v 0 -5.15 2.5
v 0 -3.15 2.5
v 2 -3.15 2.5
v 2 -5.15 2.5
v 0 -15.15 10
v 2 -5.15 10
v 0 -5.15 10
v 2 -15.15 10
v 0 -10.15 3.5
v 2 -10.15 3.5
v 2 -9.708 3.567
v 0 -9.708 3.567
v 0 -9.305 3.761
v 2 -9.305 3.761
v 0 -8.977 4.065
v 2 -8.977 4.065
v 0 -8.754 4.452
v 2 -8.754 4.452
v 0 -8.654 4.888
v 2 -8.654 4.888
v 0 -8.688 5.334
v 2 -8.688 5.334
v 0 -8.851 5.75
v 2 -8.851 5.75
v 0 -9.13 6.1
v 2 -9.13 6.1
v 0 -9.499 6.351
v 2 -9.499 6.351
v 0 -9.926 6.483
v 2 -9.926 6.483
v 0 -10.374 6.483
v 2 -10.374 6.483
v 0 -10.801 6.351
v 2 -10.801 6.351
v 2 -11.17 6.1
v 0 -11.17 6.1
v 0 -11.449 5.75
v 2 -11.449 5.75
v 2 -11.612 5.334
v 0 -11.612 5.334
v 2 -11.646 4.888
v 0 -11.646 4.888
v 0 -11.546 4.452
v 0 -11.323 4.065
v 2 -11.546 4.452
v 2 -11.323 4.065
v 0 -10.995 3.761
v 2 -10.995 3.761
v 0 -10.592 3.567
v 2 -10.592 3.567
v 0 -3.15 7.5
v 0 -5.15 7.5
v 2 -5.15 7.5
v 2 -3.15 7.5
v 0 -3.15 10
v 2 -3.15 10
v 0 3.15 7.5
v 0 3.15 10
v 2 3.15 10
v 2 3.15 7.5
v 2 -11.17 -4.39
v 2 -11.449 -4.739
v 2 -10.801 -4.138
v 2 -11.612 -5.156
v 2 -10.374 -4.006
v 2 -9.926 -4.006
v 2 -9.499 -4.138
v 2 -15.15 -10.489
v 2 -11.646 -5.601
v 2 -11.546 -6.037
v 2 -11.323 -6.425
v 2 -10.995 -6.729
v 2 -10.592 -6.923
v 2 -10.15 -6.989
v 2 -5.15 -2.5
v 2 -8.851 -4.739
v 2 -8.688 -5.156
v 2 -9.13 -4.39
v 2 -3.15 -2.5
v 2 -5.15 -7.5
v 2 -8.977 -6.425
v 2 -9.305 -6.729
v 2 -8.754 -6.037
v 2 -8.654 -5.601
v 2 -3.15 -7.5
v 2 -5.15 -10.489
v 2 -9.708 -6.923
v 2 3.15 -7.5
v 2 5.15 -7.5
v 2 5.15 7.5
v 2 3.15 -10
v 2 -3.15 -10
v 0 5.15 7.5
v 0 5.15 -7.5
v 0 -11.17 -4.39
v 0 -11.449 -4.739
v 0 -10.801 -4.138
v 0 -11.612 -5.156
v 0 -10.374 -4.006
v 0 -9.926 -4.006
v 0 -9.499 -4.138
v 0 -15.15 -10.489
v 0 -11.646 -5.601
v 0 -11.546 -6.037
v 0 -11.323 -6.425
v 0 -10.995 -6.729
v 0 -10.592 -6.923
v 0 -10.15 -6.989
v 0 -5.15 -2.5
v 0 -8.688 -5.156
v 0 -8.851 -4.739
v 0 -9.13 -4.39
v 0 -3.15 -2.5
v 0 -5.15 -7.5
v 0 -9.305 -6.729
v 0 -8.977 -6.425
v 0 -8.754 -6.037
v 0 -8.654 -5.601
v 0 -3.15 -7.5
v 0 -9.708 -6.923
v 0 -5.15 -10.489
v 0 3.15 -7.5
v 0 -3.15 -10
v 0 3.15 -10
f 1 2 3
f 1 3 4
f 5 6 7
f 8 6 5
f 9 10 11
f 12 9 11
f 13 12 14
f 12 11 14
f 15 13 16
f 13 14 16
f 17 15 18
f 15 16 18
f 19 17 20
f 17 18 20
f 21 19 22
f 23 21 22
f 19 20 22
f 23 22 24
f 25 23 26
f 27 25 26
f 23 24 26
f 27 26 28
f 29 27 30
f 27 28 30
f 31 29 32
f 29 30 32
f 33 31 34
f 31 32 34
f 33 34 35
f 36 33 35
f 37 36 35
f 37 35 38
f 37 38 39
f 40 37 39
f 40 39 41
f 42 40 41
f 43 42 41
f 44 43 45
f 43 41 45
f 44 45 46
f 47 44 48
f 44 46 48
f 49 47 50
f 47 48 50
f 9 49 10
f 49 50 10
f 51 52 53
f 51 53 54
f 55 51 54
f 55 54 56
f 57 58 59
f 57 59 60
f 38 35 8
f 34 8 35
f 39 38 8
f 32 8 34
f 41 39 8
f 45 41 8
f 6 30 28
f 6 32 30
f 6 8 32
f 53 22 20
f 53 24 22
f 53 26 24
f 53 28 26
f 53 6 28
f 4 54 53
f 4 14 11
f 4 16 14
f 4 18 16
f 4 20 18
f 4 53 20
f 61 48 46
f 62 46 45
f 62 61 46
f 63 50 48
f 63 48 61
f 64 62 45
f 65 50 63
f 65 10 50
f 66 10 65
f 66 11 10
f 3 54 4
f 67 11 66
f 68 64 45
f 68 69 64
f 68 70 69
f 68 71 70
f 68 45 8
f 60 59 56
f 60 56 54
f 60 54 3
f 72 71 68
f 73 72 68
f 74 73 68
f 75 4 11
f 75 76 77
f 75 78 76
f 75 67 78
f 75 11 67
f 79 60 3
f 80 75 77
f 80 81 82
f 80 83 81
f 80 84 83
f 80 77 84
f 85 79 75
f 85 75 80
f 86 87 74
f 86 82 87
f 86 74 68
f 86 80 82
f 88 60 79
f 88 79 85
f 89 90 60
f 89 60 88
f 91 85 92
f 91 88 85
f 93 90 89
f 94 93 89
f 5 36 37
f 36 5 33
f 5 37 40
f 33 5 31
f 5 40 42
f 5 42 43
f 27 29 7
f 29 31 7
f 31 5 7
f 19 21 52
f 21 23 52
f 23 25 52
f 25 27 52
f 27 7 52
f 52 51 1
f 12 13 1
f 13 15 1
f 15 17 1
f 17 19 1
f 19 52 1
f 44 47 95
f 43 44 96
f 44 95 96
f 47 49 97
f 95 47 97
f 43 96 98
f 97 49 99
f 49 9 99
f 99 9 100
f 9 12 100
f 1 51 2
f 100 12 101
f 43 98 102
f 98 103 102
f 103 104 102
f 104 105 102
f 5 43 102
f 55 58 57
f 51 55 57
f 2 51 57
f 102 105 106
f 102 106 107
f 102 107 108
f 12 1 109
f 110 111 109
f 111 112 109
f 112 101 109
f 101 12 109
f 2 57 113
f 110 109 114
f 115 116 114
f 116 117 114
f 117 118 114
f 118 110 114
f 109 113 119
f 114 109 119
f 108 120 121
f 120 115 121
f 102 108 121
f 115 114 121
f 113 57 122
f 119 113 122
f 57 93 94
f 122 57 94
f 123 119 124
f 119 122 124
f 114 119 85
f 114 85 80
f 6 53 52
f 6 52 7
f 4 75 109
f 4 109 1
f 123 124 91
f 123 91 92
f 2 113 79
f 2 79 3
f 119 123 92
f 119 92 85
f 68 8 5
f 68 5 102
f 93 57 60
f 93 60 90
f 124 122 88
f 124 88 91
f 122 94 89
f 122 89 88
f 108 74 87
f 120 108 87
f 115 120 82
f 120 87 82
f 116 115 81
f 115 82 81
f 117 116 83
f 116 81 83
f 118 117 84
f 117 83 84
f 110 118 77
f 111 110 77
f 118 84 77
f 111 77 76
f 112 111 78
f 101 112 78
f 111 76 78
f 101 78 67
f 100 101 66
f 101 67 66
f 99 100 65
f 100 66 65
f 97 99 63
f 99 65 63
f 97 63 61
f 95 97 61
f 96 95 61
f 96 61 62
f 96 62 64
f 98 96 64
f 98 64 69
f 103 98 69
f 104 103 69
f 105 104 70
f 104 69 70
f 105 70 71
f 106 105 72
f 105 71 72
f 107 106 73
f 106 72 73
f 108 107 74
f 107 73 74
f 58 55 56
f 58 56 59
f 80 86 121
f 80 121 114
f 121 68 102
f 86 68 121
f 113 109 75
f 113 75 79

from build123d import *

# Parameters (mm, degrees)
BOSS_EXTRUDE1_DEPTH = 2
SKETCH2_R           = 1.5
BOSS_EXTRUDE2_DEPTH = 2
SKETCH3_W           = 5
SKETCH3_H           = 2
BOSS_EXTRUDE3_DEPTH = 2


with BuildPart() as part:
    # Sketch1 → Boss-Extrude1 (new body)
    with BuildSketch(Plane(origin=(0, 0, 0), x_dir=(0, 0, -1), z_dir=(1, 0, 0))):
        Polygon((-7.5, 3.15), (-7.5, 5.15), (-2.5, 5.15), (-2.5, 3.15), (2.5, 3.15), (2.5, 5.15), (7.5, 5.15), (7.5, 3.15), (10, 3.15), (10, -3.15), (7.5, -3.15), (7.5, -5.15), (2.5, -5.15), (2.5, -3.15), (-2.5, -3.15), (-2.5, -5.15), (-7.5, -5.15), (-7.5, -3.15), (-10, -3.15), (-10, 3.15), align=None)
    extrude(amount=BOSS_EXTRUDE1_DEPTH)

    # Sketch2 → Boss-Extrude2 (add)
    with BuildSketch(Plane(origin=(2, 0, 0), x_dir=(0, 0, -1), z_dir=(1, 0, 0))):
        Polygon((-10, -5.15), (-10, -15.15), (10.489374947, -15.15), (10.489374947, -5.15), (-7.5, -5.15), align=None)
        with Locations((-5, -10.15)):
            Circle(SKETCH2_R, mode=Mode.SUBTRACT)
        with Locations((5.489374947, -10.15)):
            Circle(SKETCH2_R, mode=Mode.SUBTRACT)
    extrude(amount=-BOSS_EXTRUDE2_DEPTH)

    # Sketch3 → Boss-Extrude3 (add)
    with BuildSketch(Plane(origin=(2, 0, 0), x_dir=(0, 0, -1), z_dir=(1, 0, 0))):
        with Locations((0, 4.15)):
            Rectangle(SKETCH3_W, SKETCH3_H)
    extrude(amount=-BOSS_EXTRUDE3_DEPTH)


solid = part.part
